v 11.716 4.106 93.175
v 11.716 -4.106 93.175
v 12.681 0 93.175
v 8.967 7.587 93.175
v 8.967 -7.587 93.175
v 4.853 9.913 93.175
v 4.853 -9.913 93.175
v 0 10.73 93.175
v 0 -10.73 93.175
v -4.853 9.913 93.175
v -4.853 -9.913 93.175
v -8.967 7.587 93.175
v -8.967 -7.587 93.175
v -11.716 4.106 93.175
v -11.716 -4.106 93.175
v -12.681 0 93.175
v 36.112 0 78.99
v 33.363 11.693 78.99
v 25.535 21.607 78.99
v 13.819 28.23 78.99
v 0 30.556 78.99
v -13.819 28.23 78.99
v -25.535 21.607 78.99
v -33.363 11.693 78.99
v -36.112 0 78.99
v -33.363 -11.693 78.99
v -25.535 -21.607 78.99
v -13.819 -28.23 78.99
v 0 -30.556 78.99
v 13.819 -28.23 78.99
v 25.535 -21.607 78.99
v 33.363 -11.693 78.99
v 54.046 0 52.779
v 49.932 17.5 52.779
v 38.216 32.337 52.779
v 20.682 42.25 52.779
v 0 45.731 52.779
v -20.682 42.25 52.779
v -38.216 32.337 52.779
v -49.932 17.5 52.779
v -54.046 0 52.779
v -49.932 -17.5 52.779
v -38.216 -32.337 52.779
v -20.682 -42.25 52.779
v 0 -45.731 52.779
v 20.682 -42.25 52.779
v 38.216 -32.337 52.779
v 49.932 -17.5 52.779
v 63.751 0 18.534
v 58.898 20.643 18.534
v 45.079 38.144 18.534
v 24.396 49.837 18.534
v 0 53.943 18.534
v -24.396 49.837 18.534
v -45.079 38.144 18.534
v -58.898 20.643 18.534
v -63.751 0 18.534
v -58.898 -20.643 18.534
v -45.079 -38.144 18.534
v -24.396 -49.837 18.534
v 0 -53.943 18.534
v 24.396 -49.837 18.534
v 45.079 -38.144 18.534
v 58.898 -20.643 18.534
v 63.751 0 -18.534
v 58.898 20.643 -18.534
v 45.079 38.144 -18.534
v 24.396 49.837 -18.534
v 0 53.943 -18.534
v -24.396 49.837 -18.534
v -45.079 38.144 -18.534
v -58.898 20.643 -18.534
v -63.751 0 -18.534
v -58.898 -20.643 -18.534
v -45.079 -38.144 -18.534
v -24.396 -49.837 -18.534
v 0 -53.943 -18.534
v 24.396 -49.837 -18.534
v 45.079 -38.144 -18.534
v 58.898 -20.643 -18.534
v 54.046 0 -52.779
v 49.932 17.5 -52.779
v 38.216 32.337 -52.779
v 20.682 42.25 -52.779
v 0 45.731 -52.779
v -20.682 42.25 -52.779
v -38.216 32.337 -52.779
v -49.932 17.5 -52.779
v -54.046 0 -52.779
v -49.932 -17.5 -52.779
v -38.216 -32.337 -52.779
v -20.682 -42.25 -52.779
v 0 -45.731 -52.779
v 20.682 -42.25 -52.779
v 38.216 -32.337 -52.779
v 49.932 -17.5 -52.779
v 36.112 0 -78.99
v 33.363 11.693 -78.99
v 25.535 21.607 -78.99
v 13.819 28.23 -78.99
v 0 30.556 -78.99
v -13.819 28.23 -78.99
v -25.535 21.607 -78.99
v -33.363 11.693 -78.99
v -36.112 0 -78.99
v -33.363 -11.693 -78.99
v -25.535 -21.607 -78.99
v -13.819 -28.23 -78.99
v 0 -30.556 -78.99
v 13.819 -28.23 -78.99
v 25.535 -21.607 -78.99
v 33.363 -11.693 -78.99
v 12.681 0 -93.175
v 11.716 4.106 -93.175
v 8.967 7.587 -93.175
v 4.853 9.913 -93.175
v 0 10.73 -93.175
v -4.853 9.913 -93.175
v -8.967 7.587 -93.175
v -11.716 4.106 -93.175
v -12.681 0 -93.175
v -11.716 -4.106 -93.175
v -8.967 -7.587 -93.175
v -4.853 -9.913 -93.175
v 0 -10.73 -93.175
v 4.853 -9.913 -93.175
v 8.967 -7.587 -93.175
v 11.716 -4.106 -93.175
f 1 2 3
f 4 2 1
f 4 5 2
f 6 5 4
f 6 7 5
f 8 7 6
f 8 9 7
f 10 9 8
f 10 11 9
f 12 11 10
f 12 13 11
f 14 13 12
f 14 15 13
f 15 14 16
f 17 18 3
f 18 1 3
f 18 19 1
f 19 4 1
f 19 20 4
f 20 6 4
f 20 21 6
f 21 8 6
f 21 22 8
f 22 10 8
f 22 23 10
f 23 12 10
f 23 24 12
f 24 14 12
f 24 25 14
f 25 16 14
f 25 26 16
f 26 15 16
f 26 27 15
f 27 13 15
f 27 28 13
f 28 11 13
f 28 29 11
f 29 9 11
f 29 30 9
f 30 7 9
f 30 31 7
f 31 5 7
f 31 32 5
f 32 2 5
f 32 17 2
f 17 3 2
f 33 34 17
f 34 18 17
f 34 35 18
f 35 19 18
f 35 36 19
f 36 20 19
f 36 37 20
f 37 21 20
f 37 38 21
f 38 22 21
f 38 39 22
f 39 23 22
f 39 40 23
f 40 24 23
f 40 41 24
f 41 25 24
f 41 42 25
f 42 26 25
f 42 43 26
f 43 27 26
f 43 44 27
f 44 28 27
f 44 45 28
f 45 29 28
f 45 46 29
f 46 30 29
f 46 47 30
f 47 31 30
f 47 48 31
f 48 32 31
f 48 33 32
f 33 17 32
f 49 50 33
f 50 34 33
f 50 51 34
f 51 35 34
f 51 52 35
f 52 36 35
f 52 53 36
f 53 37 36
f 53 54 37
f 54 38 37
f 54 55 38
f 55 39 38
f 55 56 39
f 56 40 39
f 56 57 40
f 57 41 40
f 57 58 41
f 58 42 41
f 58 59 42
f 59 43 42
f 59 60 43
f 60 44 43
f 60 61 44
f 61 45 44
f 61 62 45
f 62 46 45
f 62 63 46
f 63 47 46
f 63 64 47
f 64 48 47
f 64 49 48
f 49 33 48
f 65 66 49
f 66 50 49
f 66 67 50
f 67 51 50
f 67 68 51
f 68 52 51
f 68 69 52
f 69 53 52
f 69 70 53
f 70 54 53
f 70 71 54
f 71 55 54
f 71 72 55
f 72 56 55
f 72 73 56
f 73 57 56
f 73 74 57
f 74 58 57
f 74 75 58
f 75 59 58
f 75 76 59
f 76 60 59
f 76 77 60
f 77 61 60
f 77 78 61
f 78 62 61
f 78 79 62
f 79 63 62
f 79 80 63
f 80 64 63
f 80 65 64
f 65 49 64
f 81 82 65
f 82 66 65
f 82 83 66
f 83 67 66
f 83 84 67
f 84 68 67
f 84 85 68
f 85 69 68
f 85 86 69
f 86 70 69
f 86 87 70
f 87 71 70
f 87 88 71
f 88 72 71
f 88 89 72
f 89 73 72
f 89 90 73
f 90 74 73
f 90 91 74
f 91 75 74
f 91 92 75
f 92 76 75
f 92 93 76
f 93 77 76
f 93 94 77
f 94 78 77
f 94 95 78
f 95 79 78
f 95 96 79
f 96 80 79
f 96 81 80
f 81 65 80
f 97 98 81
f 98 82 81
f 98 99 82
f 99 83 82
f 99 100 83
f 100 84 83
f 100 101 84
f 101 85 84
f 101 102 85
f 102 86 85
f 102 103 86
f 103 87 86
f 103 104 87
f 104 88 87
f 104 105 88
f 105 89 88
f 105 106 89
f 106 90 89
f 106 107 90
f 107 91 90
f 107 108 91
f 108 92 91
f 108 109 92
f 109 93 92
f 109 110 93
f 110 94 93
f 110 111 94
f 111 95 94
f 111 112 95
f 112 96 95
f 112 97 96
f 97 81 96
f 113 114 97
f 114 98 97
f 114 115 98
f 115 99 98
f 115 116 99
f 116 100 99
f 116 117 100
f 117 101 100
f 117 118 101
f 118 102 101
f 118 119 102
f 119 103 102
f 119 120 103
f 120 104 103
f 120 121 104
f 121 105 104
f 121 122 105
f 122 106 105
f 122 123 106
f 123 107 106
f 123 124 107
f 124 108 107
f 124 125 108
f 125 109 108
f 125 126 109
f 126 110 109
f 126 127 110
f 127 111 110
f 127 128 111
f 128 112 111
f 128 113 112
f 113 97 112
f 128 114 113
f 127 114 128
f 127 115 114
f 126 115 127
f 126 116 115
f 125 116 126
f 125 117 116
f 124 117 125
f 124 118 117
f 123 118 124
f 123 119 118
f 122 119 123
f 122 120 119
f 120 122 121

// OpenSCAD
// Generated by SolidPython 1.0.1 on 2020-07-29 00:46:51


scale(v = [13, 11, 19]) {
	sphere(r = 5);
}
/***********************************************
*********      SolidPython code:      **********
************************************************
 
# import packages: SolidPython
from solid import *
from solid.utils import *
from itertools import chain, combinations, permutations


class Resize:

    def __init__(self, scad_file):
        self.scad_file = scad_file
        #self.scad_file = import_scad(scad_file)
        # cone/cylinder param:
        self.r1 = 0
        self.r2 = 0
        self.h = 0
        # rectangular prism param:
        self.w = 0
        self.l = 0
        # ellipse param:
        self.r = 0

    # import OpenScad code (file name corresponds to shape)


    # classify shape + parameters
    def assign(self, param1, param2, param3):
        if self.scad_file == 'cone.scad':
            self.r1 = param1
            self.r2 = param2
            self.h = param3
        elif self.scad_file == 'cylinder.scad':
            self.r1 = param1
            self.r2 = param2
            self.h = param3
        elif self.scad_file == 'rectangularPrism.scad':
            self.h = param1
            self.l = param2
            self.w = param3
        else:
            self.r = param1
            self.h = param2

    # resize parameters
    def iterate(self):
        x = range(3, 20, 2)
        i = 1
        if self.scad_file == 'cone.scad':
            tempList = list(permutations(x, 2))
            for temp in tempList:
                param1 = temp[0]
                param2 = temp[1]
                filepath = 'produced_scad_files/' + 'cone' + str(param1) + '_' + str(param2) + '_' + '.scad'
                scad_render_to_file(cylinder(h=param1, r1=param2, r2=0), filepath)

        elif self.scad_file == 'cylinder.scad':
            tempList = list(permutations(x, 3))
            for temp in tempList:
                param1 = temp[0]
                param2 = temp[1]
                filepath = 'produced_scad_files/' + 'cylinder' + str(param1) + '_' + str(param2) + '_' + '.scad'
                scad_render_to_file(cylinder(h=param1, r1=param2, r2=param2), filepath)

        elif self.scad_file == 'rectangularPrism.scad':
            tempList = list(permutations(x, 3))
            for temp in tempList:
                param1 = temp[0]
                param2 = temp[1]
                param3 = temp[2]
                filepath = 'produced_scad_files/' + 'rectangularPrism' + str(param1) + '_' + str(param2) + '_' + str(
                    param3) + '.scad'
                scad_render_to_file(cube(size=(param1, param2, param3)), filepath)

        elif self.scad_file == 'ellipse.scad':
            tempList = list(permutations(x, 4))
            for temp in tempList:
                param1 = temp[0]
                param2 = temp[1]
                param3 = temp[2]
                param4 = temp[3]
                filepath = 'produced_scad_files/' + 'ellipse' + str(param1) + '_' + str(param2) + '_' + str(param3) + '_' + str(param4) + '.scad'
                scad_render_to_file(scale([param1, param2, param3])(sphere(r=param4)), filepath)

    def render_to_scadfile(self):
        scad_render_to_file(scad, 'example.scad') 
 
************************************************/
